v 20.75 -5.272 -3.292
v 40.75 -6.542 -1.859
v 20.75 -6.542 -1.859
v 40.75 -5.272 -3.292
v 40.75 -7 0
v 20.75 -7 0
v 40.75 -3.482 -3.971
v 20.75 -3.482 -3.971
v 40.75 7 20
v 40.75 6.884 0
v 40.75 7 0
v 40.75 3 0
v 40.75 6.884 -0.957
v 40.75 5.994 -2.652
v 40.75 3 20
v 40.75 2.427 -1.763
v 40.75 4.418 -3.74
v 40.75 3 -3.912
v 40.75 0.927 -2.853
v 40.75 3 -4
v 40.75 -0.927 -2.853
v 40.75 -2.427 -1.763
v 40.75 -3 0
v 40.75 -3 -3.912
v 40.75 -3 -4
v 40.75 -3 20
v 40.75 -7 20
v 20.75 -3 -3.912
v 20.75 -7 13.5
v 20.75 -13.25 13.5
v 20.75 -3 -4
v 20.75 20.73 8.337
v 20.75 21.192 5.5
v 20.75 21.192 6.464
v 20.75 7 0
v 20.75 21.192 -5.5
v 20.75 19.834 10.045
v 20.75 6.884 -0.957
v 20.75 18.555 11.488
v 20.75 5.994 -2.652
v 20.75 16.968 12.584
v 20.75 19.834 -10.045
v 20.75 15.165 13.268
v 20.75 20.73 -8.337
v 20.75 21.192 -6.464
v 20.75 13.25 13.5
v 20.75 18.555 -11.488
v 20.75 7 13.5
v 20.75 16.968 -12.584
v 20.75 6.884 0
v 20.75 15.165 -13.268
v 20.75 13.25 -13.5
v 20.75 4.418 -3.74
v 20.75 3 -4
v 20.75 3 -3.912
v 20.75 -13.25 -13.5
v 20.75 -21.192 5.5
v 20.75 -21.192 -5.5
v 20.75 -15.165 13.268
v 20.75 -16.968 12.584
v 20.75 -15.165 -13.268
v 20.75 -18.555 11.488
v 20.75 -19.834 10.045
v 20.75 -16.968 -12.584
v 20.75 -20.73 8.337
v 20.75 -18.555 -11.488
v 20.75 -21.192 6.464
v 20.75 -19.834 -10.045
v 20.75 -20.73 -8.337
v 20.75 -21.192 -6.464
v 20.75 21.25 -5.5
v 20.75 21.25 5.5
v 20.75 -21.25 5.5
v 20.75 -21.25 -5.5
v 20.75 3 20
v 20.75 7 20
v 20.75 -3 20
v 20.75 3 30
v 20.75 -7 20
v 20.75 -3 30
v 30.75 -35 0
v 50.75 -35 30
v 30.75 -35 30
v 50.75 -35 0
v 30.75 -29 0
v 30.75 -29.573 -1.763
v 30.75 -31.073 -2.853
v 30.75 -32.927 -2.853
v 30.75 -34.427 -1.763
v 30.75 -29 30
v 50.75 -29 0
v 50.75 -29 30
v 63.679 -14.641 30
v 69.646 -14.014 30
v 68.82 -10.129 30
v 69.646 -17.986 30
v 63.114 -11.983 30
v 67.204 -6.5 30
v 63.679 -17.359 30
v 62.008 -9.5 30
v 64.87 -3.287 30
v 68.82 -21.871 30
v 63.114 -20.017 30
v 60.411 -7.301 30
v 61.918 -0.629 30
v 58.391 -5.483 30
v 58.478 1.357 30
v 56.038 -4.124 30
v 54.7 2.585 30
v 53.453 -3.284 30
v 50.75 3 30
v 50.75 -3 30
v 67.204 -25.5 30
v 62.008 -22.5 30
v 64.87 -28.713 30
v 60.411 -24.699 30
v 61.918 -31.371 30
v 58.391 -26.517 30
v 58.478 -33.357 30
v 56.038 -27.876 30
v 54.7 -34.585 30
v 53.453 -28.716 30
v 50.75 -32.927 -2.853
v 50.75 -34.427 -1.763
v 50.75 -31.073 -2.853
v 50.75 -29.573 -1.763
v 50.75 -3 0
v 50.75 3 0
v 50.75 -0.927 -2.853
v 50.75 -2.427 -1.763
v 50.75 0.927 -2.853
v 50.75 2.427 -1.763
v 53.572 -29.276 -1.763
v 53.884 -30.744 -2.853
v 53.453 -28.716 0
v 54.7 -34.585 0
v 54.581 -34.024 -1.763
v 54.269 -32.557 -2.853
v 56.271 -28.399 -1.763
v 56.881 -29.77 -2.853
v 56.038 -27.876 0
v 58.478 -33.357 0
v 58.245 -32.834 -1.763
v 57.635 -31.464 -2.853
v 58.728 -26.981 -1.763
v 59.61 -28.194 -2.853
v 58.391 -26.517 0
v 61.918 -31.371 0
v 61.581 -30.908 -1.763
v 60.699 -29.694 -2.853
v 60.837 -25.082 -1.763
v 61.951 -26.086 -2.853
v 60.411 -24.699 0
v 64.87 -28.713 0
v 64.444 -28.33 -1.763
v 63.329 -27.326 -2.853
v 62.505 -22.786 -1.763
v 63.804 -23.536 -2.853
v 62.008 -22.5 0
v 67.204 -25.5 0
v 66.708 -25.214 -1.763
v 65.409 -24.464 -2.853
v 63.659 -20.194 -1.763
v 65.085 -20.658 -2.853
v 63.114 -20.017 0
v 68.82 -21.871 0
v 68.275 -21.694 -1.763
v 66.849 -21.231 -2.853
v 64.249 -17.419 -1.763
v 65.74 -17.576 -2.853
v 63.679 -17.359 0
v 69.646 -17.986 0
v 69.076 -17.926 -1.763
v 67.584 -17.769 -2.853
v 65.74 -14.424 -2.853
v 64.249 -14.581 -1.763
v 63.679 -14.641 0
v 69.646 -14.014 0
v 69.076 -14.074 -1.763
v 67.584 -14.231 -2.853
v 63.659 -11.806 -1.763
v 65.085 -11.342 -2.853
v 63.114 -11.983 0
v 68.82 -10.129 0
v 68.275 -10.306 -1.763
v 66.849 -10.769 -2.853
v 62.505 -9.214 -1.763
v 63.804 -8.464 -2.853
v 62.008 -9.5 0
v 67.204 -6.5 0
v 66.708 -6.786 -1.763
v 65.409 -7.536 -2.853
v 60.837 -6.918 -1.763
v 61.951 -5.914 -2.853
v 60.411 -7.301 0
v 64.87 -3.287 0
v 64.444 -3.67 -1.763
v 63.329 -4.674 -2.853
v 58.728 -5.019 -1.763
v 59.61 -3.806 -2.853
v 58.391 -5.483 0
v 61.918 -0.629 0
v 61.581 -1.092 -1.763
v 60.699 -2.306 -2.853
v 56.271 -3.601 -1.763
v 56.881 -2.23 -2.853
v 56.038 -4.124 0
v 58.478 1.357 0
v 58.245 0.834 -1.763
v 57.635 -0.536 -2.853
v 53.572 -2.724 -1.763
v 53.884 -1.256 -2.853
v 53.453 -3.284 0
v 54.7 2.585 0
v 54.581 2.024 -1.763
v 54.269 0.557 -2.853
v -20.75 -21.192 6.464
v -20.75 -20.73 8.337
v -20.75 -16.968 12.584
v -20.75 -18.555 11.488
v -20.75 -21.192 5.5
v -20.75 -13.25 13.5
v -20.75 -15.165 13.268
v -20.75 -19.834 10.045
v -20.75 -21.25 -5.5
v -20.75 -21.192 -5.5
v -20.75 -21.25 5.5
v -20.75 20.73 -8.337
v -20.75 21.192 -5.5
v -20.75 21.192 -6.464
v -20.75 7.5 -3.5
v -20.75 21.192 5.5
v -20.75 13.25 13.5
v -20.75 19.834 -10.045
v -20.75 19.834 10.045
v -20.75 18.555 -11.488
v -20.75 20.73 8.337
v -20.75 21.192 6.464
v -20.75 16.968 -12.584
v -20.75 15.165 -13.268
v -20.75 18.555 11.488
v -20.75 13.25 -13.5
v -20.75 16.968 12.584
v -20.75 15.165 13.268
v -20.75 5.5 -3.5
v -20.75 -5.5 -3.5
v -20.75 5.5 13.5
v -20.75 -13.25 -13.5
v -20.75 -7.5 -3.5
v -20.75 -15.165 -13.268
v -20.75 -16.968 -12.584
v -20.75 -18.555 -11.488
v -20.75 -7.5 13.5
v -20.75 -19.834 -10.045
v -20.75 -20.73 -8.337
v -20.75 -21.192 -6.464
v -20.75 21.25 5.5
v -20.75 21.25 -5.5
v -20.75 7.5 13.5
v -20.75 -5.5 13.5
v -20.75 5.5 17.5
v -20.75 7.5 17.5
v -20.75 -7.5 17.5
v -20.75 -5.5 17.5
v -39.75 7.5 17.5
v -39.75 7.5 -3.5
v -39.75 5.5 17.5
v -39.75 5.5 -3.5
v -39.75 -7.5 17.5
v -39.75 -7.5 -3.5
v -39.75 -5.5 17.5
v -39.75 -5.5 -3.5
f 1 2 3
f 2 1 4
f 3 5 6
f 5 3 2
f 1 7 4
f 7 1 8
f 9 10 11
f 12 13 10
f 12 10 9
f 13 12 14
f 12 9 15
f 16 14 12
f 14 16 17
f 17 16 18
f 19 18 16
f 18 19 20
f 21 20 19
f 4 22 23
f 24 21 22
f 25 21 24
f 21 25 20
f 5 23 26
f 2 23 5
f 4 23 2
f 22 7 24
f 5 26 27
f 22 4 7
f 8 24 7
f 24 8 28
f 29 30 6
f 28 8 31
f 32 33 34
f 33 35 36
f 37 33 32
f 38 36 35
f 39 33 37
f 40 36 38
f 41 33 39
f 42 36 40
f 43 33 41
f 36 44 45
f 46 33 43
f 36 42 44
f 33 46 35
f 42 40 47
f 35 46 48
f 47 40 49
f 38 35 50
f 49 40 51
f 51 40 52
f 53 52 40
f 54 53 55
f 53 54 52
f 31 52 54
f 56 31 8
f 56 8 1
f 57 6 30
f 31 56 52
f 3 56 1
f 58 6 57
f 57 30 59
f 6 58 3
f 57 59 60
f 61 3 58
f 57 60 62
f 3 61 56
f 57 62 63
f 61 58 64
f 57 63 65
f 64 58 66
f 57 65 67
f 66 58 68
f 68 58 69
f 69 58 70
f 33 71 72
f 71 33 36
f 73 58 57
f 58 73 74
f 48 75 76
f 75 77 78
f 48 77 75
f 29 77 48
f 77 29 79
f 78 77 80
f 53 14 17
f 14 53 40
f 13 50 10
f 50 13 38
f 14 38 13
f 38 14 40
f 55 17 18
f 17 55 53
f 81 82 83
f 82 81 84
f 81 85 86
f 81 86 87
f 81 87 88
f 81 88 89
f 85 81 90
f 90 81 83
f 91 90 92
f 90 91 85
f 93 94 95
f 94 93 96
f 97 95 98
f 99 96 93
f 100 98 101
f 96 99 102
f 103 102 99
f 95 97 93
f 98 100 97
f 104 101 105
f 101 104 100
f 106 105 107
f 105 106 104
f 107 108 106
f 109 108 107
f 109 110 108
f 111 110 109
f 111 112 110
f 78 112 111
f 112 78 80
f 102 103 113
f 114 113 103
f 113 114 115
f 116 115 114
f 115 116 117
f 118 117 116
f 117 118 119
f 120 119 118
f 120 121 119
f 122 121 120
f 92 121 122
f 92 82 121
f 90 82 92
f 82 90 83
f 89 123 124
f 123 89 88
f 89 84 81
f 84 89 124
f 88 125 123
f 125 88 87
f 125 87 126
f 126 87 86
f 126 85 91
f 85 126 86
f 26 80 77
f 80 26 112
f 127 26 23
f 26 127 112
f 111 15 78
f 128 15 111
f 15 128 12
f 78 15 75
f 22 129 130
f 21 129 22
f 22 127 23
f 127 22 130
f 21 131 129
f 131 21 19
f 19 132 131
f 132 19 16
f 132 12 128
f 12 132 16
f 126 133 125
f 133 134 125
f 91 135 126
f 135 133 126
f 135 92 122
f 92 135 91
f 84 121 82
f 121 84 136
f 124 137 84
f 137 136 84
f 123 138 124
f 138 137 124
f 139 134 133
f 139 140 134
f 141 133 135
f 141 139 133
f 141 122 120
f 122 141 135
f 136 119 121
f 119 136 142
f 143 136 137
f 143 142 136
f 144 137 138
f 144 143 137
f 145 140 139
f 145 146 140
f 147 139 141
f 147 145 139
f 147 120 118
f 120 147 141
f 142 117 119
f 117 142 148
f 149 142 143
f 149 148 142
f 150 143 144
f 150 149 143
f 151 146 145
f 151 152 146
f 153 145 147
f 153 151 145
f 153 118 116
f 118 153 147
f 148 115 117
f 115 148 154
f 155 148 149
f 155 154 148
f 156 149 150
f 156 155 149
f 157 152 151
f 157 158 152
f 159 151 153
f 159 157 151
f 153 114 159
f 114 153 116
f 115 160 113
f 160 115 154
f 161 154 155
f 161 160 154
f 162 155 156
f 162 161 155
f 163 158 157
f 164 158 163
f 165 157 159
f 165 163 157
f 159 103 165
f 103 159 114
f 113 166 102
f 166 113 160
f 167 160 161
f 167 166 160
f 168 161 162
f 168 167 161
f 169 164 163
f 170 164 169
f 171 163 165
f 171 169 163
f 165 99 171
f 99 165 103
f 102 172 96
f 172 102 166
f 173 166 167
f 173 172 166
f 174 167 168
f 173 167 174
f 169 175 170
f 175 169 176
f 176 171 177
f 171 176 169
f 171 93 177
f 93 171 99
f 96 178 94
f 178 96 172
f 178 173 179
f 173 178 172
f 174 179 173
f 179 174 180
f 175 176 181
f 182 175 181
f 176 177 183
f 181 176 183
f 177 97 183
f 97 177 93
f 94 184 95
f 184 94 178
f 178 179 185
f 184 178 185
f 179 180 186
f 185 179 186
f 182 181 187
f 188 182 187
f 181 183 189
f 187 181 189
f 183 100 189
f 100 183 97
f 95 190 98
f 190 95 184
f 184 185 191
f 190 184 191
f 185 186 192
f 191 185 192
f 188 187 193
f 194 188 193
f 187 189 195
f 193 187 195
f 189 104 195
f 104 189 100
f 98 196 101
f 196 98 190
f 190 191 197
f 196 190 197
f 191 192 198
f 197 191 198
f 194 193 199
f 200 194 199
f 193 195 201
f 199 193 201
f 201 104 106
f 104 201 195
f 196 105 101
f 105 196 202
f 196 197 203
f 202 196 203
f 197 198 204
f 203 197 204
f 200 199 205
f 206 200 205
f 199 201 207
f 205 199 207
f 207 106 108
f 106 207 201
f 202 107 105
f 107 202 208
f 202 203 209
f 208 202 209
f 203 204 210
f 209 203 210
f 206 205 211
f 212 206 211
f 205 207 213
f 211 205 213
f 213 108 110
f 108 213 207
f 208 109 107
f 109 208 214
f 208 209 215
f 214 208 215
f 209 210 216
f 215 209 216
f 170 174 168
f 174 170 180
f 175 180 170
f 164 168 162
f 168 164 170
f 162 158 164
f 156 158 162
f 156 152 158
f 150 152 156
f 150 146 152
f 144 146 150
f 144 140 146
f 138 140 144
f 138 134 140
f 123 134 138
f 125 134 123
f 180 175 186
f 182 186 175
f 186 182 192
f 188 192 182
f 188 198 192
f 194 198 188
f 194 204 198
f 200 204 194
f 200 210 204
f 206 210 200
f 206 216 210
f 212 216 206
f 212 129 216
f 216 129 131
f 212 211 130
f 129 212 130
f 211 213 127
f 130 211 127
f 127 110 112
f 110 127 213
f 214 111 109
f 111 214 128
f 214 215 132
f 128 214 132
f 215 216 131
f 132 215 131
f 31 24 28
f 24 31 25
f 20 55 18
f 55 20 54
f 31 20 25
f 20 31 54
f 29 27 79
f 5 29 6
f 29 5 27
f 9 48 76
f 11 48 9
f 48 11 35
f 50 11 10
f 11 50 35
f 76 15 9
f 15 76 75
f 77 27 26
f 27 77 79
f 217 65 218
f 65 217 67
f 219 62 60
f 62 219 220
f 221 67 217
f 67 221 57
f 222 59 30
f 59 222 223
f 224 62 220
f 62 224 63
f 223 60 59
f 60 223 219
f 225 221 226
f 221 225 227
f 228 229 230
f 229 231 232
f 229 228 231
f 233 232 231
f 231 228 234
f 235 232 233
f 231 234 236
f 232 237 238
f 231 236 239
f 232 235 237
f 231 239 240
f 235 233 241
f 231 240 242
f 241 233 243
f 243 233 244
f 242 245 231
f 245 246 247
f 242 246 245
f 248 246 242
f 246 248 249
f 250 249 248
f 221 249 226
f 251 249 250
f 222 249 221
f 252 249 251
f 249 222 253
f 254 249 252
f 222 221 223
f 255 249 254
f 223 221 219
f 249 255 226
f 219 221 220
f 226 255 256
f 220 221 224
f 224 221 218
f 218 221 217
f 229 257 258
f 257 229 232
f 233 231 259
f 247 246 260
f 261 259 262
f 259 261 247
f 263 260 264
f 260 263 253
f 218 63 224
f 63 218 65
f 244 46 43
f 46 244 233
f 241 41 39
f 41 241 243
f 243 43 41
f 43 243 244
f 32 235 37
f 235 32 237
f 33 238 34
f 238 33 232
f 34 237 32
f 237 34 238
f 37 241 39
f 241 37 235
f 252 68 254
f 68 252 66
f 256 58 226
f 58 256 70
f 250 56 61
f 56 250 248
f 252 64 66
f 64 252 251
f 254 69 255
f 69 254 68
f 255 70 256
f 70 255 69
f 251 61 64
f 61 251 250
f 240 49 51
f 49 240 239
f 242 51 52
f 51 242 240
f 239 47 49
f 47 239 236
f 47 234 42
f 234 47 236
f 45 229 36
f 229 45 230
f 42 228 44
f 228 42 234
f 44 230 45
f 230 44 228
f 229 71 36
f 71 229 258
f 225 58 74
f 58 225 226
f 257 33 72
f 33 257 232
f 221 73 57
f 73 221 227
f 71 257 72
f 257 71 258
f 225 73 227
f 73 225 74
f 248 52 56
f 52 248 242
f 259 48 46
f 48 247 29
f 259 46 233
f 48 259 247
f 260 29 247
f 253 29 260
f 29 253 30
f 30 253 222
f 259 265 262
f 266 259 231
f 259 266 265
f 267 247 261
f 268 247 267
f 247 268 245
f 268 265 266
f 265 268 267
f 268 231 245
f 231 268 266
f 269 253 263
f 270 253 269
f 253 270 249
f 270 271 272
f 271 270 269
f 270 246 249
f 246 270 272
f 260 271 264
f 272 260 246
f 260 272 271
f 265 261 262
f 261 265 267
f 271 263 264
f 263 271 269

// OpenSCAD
// file: Cord.scad
// Library: Cord.scad
// Version: 1.0.0
// Author: David Bowers
// Copyright: 2022
// License: 2-clause BSD License (http://opensource.org/licenses/BSD-2-Clause)

// cord(
//  straight_section,
//  curve_radius,
//  cord_thickness,
//  degree_of_curve,
//  tail_section
// );

// EXAMPLE USAGE:
// cord();

// the tail and the start should be their own pieces
module cord(
    straight_section = 30,
    curve_radius = 20,
    cord_thickness = 6,
    degree_of_curve = 180,
    tail_section = 30
)
{
    translate([0, 0, abs(straight_section/2-tail_section/2)]){
        translate([0, -15, 0])
            cube(
                [cord_thickness, 
                30, 
                tail_section], 
                center=true
            );
        cylinder(
            h = tail_section, 
            d = cord_thickness, 
            center = true);
    }
    translate([-curve_radius,0,straight_section/2]){
        rotate([90,0,0]){
            rotate_extrude(angle=degree_of_curve){
                translate([curve_radius,0])
                    circle(d=cord_thickness);
                translate([curve_radius, 15])
                    square([cord_thickness, 30],                center = true);   
            }
        }
    }
    translate([-curve_radius*2, 0, 0]){
        translate([0, -15, 0])
        cube(
            [cord_thickness, 
            30, 
            straight_section], 
            center=true
            );
        cylinder(
        h = straight_section, 
        d = cord_thickness, 
        center = true
            );
    }
          
}

cord();
// file: twentyWUSBCBlock.scad
// Library: twentyWUSBCBlock.scad
// Version: 1.0.0
// Author: David Bowers
// Copyright: 2022
// License: 2-clause BSD License (http://opensource.org/licenses/BSD-2-Clause)

// twenty_charger_block(length, width, height, edge_radius);

// EXAMPLE USAGE:
// twenty_charger_block();

include <MCAD/boxes.scad>

block_length = 41.5;
block_edge_rad = 8;

function get_block_length() = block_length;
function get_block_edge_rad() = block_edge_rad;

module prong(
    length = 19,
    width = 7,
    thickness = 2
    )
    {
        translate([-length/2,0,0])
        rotate([0,0,90])        
        cube([thickness, length, width], center = true);
    }

module twenty_charger_block(
    length = block_length, 
    width = 42.5,
    height = 27, 
    edge_radius = block_edge_rad)
{
    rotate([0,90,0])
    roundedBox(
        size=[ height, width, length],
        radius=edge_radius,
        sidesonly=true
    );
    for (z = [0 : 2]){
        for (i = [1, -1]){
        translate([-length/2, i*6.5, z*7])
        prong();
        }
    }

}

twenty_charger_block();
// file: usbCPlug.scad
// Library: usbCPlug.scad
// Version: 1.0.0
// Author: David Bowers
// Copyright: 2022
// License: 2-clause BSD License (http://opensource.org/licenses/BSD-2-Clause)

// For print resolution
//$fa = 1;
//$fs = 0.4;

use <./Cord.scad>

cord_radius = 16;
plug_length = 20;

function get_cord_radius() = cord_radius;
function get_plug_length() = plug_length;

module usbCPlug(
    length = plug_length,
    width = 14,
    depth = 8,
    cord_rad = cord_radius
    )
    {
        centerline = (width - depth)/2;
        for (i = [1, -1]){
            translate([i * centerline, 0, 0]){
                cylinder(h = length, d = depth, center = true);
            }
        }
        cube([width - depth, depth, length], center = true);
        translate([0,-10,0])
        cube([width, 20, length], center = true);
        translate([cord_rad*2,0,5])
        cord(
            straight_section = 30,
            curve_radius = cord_rad,
            cord_thickness = 6,
            degree_of_curve = 180,
            tail_section = 20
            );
    }
    
    usbCPlug();
    
// main file
// Library: twentyWCharger.scad
// Version: 1.0.0
// Author: David Bowers
// Copyright: 2022
// License: 2-clause BSD License (http://opensource.org/licenses/BSD-2-Clause)

use <./usbCPlug.scad>;
use <./twentyWUSBCBlock.scad>;

cord_radius = get_cord_radius();
plug_length = get_plug_length();
block_length = get_block_length();
function get_block_rad() = get_block_edge_rad();

module twentyWCharger(
    p_length = plug_length,
    c_radius = cord_radius,
    b_length = block_length
){
    translate([(p_length+b_length)/2,0,0])
    rotate([90,180,90])
    usbCPlug();
    twenty_charger_block();
}

twentyWCharger();
